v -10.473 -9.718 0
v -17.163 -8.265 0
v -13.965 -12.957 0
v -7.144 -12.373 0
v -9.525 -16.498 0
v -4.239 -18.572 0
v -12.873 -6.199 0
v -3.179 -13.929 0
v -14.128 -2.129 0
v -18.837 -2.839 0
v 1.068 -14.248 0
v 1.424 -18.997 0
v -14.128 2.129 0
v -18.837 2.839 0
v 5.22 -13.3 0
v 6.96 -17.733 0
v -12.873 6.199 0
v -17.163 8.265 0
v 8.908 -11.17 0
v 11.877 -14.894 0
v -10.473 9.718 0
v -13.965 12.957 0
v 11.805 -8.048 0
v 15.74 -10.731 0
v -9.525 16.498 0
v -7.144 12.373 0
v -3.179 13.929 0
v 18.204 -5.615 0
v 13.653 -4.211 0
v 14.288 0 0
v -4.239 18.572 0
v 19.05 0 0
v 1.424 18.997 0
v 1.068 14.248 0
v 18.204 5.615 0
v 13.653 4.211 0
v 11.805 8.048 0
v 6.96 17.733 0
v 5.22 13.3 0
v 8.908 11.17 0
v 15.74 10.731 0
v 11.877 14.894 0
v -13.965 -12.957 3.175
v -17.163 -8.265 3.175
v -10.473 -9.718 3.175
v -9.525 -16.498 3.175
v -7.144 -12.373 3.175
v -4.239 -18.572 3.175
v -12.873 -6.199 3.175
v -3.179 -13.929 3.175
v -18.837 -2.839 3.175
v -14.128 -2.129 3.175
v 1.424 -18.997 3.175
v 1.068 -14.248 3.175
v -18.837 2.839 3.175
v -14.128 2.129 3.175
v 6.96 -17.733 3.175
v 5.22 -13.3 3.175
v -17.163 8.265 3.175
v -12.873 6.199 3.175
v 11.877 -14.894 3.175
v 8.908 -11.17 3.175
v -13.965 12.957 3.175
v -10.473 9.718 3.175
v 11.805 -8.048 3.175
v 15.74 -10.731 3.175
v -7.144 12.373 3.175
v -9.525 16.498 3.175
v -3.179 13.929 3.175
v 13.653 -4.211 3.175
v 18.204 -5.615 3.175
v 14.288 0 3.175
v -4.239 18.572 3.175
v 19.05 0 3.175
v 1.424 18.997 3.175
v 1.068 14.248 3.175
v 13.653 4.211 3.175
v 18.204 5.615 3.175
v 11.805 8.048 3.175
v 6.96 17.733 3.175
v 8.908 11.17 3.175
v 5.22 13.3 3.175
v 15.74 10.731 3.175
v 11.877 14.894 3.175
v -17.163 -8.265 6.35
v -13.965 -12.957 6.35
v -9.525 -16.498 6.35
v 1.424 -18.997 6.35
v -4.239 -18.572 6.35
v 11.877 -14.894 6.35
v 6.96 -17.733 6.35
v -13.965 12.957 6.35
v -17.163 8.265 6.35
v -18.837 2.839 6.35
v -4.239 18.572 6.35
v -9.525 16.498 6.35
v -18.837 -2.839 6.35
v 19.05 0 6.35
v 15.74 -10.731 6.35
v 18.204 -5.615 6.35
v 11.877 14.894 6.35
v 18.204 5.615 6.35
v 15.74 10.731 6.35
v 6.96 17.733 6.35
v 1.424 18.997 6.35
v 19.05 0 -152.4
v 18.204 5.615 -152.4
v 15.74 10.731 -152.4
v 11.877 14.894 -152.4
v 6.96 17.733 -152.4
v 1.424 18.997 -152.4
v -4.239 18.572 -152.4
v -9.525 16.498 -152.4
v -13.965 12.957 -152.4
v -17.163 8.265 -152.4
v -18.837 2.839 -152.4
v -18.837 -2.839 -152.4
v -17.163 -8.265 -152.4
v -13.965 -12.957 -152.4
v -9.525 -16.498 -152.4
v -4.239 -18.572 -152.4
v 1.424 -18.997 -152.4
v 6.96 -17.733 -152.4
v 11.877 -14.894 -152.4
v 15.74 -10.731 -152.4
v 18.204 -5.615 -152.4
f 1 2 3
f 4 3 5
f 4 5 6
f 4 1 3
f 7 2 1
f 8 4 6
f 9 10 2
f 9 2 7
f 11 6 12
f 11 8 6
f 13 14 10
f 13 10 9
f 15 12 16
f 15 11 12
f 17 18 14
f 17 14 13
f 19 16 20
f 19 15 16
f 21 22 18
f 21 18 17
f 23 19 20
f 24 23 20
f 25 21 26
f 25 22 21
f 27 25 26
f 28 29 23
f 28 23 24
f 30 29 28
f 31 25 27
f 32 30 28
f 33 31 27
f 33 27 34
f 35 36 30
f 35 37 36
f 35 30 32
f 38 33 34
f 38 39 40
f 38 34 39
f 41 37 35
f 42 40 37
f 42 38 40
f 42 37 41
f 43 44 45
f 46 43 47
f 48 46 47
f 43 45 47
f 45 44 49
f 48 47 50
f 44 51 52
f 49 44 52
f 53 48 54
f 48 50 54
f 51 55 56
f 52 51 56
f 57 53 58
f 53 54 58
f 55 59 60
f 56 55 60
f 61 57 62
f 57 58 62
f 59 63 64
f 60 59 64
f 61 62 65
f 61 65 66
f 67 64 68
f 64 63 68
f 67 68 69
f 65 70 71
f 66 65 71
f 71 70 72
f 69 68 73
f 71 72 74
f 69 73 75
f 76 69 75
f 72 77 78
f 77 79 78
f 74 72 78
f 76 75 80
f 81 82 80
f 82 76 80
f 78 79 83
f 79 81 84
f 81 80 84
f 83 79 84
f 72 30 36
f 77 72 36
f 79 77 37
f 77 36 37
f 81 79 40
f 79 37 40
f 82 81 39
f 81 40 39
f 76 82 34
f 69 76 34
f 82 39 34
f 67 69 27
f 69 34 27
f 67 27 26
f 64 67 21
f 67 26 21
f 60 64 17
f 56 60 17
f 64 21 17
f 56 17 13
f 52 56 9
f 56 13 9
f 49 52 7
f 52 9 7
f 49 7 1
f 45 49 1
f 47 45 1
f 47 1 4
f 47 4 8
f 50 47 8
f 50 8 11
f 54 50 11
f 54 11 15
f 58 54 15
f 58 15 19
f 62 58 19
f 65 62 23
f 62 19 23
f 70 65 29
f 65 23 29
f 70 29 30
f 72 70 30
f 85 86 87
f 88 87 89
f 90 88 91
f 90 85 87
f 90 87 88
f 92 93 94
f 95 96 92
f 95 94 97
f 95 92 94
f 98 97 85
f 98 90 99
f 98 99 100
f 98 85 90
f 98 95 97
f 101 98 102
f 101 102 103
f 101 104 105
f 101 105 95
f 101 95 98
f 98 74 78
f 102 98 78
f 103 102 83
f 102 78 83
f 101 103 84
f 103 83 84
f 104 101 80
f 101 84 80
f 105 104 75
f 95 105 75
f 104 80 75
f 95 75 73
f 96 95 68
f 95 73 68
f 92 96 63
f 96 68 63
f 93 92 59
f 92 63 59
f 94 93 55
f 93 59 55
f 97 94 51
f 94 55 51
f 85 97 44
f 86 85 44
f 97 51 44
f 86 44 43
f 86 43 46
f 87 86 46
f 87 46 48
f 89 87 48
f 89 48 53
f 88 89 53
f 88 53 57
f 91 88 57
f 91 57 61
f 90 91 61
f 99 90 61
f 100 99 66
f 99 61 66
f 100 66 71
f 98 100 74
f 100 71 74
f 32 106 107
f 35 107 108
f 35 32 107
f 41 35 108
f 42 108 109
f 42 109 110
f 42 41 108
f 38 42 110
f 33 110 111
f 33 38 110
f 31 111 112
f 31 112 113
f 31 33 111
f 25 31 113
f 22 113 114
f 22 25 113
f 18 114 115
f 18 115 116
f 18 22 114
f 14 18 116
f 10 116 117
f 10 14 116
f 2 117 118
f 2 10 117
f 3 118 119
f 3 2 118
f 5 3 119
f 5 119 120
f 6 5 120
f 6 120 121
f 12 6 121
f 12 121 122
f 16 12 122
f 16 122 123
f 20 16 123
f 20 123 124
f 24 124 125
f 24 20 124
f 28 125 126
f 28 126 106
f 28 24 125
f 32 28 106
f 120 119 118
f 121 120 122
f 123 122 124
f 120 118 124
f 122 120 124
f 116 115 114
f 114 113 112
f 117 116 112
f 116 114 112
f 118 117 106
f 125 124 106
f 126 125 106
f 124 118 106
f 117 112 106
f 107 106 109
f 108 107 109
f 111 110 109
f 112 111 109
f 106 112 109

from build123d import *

# Parameters (mm, degrees)
F0_R     = 19.05
F1_DEPTH = 152.4
F2_R     = 14.2875
F3_DEPTH = 3.175
F4_R     = 19.05
F5_DEPTH = 3.175


with BuildPart() as f1:
    # F0 (on Top) → F1 (new body)
    with BuildSketch(Plane.XY):
        Circle(F0_R)
    extrude(amount=-F1_DEPTH)

    # F2 (on face) → F3 (join)
    with BuildSketch(Plane.XY):
        Circle(F2_R)
    extrude(amount=F3_DEPTH)

    # F4 (on face) → F5 (join)
    with BuildSketch(Plane.XY.offset(3.175)):
        Circle(F4_R)
    extrude(amount=F5_DEPTH)


solid = f1.part
